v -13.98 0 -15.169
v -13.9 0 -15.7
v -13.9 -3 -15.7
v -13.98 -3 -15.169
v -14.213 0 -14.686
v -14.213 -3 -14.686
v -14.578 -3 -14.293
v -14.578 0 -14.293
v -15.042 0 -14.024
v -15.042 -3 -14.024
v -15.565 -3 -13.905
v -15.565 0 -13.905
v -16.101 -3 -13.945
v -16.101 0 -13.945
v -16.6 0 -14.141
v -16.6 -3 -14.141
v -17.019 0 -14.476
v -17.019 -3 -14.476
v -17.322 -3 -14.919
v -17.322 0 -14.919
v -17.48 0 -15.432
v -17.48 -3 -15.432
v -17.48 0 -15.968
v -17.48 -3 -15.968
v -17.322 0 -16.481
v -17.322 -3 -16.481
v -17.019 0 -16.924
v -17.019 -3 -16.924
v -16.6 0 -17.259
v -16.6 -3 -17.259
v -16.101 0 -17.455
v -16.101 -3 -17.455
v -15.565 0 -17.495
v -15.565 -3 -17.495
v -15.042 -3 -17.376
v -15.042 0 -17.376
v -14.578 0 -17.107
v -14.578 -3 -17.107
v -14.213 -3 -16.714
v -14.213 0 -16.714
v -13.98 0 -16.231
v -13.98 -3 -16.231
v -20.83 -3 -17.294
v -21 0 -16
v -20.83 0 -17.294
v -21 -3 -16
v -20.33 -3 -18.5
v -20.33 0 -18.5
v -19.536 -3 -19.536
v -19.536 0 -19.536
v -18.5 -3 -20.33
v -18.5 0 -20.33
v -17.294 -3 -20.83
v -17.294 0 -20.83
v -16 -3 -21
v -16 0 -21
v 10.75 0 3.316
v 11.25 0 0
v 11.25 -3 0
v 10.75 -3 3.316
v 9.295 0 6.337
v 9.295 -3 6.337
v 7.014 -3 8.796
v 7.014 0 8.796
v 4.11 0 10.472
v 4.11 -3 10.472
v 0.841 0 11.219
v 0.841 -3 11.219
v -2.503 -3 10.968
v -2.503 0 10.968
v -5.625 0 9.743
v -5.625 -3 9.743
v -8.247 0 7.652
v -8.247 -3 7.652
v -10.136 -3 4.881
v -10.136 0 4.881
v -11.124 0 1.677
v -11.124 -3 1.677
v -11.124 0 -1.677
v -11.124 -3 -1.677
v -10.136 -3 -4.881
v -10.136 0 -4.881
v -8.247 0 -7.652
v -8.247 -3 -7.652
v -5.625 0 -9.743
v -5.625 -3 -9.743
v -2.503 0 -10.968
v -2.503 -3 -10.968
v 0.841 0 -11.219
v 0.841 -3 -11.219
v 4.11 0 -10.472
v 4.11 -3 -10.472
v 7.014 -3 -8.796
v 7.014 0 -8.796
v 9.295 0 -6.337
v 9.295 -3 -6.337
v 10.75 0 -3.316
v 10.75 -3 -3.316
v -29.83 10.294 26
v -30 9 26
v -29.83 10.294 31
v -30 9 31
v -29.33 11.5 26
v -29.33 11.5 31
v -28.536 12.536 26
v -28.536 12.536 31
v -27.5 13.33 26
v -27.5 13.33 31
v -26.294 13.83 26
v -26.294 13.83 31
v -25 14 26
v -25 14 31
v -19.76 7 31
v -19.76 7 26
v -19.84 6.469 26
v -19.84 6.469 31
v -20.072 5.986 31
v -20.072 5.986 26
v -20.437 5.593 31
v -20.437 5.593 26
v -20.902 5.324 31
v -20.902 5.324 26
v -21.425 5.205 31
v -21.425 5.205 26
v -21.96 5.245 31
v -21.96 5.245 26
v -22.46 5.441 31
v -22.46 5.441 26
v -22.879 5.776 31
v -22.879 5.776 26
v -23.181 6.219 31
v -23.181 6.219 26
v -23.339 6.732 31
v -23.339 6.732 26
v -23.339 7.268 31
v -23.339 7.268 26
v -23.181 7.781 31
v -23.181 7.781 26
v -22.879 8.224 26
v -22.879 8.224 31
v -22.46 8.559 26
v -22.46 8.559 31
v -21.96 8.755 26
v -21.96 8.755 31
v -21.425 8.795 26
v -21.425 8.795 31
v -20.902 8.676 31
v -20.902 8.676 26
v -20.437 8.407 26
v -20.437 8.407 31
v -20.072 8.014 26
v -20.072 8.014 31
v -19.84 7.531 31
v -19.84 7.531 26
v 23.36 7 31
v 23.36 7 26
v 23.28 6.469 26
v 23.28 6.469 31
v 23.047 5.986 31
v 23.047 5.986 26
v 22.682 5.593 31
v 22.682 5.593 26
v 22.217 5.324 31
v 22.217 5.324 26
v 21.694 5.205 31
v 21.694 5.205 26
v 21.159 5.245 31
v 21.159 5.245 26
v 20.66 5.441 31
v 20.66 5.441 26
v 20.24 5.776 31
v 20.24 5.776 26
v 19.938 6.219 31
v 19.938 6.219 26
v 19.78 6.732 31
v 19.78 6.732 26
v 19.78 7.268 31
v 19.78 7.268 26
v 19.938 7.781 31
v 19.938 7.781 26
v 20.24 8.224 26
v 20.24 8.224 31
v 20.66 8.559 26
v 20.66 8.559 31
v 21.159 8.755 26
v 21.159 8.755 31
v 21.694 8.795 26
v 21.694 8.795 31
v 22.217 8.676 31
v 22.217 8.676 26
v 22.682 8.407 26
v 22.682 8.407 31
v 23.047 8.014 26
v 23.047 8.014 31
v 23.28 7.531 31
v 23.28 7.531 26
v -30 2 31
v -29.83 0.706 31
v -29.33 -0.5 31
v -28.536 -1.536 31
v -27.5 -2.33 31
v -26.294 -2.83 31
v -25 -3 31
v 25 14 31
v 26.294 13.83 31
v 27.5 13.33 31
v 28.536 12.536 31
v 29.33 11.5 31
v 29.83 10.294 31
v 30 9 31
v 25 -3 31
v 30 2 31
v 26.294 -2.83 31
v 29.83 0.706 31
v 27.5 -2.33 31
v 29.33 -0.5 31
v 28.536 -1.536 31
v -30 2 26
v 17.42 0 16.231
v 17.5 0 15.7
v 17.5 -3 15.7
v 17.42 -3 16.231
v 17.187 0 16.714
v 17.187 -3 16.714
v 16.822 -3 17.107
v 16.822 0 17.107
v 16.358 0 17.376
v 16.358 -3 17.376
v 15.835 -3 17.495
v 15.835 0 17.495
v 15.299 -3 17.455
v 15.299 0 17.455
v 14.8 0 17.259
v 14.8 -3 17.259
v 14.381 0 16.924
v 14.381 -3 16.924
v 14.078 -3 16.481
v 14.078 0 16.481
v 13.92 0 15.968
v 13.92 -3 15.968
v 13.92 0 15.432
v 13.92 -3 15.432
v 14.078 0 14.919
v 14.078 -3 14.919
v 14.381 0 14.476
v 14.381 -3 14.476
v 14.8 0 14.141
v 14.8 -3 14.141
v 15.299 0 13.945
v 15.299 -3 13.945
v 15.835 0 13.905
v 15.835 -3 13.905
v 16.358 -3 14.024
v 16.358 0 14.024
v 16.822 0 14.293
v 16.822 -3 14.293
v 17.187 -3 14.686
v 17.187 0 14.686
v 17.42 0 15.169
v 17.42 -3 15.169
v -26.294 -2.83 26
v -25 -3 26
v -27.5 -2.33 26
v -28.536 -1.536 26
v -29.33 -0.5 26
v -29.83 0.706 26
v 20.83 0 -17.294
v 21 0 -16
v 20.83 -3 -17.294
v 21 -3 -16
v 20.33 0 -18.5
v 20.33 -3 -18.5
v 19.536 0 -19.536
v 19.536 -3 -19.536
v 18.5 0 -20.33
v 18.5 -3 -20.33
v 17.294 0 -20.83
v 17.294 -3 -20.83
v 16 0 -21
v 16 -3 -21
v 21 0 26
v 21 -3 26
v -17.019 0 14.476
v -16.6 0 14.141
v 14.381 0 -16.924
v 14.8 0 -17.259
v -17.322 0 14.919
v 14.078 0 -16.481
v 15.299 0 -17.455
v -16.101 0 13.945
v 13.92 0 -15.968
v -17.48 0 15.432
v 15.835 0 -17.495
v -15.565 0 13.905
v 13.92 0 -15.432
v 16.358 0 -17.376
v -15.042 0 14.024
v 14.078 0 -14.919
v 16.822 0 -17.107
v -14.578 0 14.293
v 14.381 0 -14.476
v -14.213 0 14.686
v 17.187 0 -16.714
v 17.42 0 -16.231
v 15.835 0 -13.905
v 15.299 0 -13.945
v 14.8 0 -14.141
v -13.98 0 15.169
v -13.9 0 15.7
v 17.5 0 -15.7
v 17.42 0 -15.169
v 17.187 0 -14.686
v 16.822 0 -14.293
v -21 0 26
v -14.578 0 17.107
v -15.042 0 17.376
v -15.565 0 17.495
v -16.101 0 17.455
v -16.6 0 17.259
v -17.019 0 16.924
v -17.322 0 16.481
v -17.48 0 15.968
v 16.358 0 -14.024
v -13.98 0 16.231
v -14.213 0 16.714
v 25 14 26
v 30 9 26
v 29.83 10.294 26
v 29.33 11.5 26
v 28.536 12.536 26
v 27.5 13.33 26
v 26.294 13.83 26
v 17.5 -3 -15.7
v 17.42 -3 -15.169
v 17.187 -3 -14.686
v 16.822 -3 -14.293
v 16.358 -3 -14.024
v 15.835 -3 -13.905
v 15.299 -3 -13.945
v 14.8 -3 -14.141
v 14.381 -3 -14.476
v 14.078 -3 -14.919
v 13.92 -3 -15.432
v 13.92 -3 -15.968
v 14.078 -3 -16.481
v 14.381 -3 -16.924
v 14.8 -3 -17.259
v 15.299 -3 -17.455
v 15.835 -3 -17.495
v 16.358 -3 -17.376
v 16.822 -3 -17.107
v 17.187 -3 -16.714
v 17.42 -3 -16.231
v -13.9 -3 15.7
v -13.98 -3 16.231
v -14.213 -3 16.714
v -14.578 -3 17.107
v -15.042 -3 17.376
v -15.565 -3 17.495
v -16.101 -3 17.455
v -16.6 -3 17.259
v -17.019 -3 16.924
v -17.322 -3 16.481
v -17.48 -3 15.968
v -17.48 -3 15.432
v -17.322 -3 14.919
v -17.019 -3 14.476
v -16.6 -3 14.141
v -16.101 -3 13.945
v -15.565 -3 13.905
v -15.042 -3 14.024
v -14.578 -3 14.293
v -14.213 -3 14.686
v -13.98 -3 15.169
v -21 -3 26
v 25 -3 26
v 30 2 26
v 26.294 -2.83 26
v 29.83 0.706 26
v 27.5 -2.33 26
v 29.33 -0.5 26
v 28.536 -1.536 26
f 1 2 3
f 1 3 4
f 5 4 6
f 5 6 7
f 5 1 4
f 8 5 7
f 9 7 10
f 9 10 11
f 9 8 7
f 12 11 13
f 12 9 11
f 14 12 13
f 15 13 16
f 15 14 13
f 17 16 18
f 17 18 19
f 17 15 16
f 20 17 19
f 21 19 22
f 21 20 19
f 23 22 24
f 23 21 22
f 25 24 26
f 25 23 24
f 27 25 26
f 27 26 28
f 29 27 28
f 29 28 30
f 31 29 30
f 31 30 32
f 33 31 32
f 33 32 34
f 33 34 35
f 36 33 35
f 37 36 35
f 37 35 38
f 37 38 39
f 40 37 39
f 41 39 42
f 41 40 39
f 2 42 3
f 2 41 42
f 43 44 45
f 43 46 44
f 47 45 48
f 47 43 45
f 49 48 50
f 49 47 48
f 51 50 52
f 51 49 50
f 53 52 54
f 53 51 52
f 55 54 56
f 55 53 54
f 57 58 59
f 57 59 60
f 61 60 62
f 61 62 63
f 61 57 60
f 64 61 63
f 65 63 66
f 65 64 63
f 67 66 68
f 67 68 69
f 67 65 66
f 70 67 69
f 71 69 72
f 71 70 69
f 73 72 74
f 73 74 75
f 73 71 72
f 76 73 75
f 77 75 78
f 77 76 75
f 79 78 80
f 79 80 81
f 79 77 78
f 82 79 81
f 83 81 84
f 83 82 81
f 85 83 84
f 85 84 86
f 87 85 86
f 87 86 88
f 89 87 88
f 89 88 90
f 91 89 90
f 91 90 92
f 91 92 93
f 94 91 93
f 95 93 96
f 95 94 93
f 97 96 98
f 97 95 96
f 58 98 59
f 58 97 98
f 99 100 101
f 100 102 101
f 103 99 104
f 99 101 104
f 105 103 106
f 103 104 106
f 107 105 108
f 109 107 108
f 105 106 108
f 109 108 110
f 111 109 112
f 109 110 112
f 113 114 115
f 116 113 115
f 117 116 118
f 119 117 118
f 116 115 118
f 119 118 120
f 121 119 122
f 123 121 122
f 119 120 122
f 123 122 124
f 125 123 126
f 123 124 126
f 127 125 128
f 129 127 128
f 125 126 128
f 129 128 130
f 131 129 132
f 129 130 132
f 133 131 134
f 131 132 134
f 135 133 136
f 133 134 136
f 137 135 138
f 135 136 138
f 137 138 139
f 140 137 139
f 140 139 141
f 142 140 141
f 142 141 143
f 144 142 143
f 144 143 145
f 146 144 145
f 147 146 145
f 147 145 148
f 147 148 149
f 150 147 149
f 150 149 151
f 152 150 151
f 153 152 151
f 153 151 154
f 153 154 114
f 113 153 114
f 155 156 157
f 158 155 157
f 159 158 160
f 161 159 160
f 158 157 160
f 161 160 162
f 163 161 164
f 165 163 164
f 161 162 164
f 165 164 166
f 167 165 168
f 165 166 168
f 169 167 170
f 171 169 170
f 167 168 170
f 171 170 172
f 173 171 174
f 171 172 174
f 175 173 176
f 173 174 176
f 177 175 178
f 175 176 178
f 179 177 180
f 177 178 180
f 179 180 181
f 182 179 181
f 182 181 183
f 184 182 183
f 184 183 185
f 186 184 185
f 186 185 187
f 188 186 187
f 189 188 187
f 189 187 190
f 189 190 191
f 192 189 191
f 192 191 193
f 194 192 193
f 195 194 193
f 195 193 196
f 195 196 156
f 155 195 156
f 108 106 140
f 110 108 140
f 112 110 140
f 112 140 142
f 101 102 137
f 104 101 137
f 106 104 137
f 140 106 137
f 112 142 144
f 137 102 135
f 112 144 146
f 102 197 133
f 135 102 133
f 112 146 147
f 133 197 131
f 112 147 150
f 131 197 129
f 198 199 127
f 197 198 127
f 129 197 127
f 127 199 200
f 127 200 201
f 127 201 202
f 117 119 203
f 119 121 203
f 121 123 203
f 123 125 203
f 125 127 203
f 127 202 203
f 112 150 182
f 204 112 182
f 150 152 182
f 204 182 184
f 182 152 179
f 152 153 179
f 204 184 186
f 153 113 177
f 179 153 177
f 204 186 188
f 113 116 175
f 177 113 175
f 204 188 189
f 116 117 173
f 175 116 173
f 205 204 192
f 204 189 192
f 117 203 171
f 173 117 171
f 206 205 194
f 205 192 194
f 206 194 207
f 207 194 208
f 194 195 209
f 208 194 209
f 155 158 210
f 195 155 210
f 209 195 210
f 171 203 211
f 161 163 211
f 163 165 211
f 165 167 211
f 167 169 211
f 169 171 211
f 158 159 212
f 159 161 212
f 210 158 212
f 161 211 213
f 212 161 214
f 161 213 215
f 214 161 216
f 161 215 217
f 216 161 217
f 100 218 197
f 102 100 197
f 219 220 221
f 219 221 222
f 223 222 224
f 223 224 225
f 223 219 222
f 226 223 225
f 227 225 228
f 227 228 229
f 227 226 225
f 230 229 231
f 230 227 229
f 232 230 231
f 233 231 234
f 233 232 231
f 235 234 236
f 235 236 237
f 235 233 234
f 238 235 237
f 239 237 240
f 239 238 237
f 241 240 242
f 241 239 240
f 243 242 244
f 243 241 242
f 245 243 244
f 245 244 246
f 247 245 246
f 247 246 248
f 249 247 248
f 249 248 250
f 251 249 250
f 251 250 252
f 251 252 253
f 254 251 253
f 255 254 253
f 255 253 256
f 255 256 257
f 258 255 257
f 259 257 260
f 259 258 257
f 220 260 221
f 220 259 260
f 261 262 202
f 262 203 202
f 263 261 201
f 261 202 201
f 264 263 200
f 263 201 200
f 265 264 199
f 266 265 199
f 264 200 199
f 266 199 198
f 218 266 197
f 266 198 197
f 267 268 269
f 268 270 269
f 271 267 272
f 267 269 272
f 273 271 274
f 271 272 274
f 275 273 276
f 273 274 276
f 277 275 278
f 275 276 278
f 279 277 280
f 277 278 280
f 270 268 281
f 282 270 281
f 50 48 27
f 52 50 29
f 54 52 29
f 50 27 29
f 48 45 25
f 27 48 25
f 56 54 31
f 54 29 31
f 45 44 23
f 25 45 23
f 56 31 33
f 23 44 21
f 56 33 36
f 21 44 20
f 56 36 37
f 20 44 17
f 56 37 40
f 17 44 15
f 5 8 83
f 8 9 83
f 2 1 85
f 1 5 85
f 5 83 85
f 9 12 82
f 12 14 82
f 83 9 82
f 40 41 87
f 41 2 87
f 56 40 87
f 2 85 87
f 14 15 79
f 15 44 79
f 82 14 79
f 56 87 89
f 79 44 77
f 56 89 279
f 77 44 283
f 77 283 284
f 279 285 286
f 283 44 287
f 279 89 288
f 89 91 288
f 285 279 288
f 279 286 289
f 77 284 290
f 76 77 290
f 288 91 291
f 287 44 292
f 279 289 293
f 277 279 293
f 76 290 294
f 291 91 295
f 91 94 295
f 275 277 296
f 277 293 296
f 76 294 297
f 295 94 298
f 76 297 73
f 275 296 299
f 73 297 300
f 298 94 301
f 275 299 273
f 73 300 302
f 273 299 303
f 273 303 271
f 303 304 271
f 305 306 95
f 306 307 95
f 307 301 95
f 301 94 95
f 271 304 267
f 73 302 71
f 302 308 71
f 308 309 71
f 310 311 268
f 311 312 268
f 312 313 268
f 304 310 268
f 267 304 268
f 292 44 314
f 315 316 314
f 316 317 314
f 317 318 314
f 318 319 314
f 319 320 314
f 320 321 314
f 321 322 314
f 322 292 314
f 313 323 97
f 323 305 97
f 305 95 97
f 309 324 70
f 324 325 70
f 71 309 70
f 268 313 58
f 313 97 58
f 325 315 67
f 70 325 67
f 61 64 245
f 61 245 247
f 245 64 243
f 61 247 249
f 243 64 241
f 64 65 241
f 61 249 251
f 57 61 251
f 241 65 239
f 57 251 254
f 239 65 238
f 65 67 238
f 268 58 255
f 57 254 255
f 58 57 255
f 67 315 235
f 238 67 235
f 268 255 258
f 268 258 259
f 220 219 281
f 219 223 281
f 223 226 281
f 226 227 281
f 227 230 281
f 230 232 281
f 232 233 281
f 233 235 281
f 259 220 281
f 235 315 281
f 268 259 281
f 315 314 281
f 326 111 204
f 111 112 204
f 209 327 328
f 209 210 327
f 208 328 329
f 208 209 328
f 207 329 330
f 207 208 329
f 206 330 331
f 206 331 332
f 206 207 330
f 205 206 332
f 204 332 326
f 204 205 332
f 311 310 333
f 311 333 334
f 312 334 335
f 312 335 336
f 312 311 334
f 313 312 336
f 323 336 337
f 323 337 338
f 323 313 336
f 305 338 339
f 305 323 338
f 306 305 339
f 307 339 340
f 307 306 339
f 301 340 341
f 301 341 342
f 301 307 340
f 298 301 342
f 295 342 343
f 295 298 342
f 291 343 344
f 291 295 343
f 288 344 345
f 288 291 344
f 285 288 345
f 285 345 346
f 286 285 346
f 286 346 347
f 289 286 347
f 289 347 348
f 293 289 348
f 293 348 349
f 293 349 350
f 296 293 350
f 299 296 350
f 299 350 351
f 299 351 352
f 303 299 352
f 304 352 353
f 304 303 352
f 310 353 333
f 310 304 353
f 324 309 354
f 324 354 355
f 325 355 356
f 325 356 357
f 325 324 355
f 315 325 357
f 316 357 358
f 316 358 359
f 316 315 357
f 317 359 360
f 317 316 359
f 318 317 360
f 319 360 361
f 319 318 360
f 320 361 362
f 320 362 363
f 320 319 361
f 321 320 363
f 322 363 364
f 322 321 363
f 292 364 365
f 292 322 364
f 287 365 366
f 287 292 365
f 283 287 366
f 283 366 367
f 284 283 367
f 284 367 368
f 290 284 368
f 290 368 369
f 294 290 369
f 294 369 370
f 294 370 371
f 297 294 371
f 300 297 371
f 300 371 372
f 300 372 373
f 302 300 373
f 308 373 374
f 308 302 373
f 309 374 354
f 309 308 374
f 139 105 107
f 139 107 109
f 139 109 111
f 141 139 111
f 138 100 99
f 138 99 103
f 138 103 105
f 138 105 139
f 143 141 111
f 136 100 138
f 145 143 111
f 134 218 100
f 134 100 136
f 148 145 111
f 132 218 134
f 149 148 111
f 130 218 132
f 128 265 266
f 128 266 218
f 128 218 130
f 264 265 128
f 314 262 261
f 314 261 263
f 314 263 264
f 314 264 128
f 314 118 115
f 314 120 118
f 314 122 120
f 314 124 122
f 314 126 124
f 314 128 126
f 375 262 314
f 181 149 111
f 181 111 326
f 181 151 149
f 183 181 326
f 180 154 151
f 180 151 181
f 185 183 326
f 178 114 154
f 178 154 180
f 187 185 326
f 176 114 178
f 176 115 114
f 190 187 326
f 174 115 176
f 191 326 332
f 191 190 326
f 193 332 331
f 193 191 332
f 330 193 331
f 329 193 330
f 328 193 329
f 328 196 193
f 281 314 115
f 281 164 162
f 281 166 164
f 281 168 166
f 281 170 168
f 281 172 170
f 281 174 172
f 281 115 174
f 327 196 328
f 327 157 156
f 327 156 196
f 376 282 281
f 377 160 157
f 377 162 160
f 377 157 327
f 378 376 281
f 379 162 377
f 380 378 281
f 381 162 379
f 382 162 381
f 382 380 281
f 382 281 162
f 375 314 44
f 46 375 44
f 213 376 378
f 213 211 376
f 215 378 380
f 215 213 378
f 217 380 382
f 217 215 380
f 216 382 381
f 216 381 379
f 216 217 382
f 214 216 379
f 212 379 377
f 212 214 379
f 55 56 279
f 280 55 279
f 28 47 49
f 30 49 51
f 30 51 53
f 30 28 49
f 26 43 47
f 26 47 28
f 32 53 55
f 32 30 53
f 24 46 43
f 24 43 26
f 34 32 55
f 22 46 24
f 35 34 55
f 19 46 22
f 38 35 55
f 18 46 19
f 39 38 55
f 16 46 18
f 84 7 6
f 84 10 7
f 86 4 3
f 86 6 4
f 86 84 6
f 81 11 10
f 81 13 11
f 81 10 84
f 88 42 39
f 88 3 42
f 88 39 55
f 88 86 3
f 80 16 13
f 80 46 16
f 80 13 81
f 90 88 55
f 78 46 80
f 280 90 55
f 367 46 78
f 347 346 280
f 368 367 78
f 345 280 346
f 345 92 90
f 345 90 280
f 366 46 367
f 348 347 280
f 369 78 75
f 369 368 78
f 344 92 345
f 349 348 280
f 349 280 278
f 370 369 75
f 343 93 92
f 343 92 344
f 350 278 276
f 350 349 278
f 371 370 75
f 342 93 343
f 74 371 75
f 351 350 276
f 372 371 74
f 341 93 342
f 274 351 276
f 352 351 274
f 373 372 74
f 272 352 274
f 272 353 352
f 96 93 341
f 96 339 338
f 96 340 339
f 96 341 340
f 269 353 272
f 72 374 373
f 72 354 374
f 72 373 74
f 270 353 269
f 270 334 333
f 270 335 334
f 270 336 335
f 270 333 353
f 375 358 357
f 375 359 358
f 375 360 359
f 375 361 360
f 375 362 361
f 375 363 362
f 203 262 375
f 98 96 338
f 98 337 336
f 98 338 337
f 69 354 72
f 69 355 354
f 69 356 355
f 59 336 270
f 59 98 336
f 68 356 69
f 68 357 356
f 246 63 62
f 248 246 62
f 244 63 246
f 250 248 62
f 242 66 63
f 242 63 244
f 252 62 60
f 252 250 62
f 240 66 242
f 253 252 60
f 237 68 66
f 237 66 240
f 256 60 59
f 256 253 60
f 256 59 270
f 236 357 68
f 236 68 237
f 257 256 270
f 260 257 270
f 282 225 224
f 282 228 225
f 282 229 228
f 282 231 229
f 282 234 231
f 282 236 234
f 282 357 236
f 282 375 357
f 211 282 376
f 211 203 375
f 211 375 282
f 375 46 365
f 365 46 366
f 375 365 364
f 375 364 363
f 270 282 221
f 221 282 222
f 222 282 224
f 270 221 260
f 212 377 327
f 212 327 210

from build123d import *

# Parameters (mm, degrees)
F0_R     = 1.8
F0_R_2   = 11.25
F1_DEPTH = 3
F2_W     = 60
F2_H     = 5
F3_DEPTH = 17
F4_R     = 1.8
F5_DEPTH = 5.001
F6_R     = 5
F7_R     = 5


with BuildPart() as f1:
    # F0 (on Front) → F1 (new body)
    with BuildSketch(Plane.XZ):
        Polygon((-21, -21), (21, -21), (21, 21), (21, 31), (-21, 31), (-21, 21), align=None)
        with Locations((-15.7, -15.7)):
            Circle(F0_R, mode=Mode.SUBTRACT)
        with Locations((15.7, -15.7)):
            Circle(F0_R, mode=Mode.SUBTRACT)
        Circle(F0_R_2, mode=Mode.SUBTRACT)
        with Locations((-15.7, 15.7)):
            Circle(F0_R, mode=Mode.SUBTRACT)
        with Locations((15.7, 15.7)):
            Circle(F0_R, mode=Mode.SUBTRACT)
    extrude(amount=F1_DEPTH)

    # F2 (on face) → F3 (join)
    with BuildSketch(Plane.XZ.offset(3)):
        with Locations((0, 28.5)):
            Rectangle(F2_W, F2_H)
    extrude(amount=-F3_DEPTH)

    # F4 (on face) → F5 (cut, through all)
    with BuildSketch(Plane(origin=(0, 0, 26), x_dir=(1, 0, 0), z_dir=(0, 0, -1))):
        with Locations((-21.55957, -7)):
            Circle(F4_R)
        with Locations((21.55957, -7)):
            Circle(F4_R)
    extrude(amount=-F5_DEPTH, mode=Mode.SUBTRACT)

    # F6
    f6_edges = [f1.edges().sort_by_distance(p)[0] for p in [
        (21, -1.5, -21),
        (-21, -1.5, -21),
    ]]
    fillet(f6_edges, radius=F6_R)

    # F7
    f7_edges = [f1.edges().sort_by_distance(p)[0] for p in [
        (-30, -3, 28.5),
        (-30, 14, 28.5),
        (30, -3, 28.5),
        (30, 14, 28.5),
    ]]
    fillet(f7_edges, radius=F7_R)


solid = f1.part
